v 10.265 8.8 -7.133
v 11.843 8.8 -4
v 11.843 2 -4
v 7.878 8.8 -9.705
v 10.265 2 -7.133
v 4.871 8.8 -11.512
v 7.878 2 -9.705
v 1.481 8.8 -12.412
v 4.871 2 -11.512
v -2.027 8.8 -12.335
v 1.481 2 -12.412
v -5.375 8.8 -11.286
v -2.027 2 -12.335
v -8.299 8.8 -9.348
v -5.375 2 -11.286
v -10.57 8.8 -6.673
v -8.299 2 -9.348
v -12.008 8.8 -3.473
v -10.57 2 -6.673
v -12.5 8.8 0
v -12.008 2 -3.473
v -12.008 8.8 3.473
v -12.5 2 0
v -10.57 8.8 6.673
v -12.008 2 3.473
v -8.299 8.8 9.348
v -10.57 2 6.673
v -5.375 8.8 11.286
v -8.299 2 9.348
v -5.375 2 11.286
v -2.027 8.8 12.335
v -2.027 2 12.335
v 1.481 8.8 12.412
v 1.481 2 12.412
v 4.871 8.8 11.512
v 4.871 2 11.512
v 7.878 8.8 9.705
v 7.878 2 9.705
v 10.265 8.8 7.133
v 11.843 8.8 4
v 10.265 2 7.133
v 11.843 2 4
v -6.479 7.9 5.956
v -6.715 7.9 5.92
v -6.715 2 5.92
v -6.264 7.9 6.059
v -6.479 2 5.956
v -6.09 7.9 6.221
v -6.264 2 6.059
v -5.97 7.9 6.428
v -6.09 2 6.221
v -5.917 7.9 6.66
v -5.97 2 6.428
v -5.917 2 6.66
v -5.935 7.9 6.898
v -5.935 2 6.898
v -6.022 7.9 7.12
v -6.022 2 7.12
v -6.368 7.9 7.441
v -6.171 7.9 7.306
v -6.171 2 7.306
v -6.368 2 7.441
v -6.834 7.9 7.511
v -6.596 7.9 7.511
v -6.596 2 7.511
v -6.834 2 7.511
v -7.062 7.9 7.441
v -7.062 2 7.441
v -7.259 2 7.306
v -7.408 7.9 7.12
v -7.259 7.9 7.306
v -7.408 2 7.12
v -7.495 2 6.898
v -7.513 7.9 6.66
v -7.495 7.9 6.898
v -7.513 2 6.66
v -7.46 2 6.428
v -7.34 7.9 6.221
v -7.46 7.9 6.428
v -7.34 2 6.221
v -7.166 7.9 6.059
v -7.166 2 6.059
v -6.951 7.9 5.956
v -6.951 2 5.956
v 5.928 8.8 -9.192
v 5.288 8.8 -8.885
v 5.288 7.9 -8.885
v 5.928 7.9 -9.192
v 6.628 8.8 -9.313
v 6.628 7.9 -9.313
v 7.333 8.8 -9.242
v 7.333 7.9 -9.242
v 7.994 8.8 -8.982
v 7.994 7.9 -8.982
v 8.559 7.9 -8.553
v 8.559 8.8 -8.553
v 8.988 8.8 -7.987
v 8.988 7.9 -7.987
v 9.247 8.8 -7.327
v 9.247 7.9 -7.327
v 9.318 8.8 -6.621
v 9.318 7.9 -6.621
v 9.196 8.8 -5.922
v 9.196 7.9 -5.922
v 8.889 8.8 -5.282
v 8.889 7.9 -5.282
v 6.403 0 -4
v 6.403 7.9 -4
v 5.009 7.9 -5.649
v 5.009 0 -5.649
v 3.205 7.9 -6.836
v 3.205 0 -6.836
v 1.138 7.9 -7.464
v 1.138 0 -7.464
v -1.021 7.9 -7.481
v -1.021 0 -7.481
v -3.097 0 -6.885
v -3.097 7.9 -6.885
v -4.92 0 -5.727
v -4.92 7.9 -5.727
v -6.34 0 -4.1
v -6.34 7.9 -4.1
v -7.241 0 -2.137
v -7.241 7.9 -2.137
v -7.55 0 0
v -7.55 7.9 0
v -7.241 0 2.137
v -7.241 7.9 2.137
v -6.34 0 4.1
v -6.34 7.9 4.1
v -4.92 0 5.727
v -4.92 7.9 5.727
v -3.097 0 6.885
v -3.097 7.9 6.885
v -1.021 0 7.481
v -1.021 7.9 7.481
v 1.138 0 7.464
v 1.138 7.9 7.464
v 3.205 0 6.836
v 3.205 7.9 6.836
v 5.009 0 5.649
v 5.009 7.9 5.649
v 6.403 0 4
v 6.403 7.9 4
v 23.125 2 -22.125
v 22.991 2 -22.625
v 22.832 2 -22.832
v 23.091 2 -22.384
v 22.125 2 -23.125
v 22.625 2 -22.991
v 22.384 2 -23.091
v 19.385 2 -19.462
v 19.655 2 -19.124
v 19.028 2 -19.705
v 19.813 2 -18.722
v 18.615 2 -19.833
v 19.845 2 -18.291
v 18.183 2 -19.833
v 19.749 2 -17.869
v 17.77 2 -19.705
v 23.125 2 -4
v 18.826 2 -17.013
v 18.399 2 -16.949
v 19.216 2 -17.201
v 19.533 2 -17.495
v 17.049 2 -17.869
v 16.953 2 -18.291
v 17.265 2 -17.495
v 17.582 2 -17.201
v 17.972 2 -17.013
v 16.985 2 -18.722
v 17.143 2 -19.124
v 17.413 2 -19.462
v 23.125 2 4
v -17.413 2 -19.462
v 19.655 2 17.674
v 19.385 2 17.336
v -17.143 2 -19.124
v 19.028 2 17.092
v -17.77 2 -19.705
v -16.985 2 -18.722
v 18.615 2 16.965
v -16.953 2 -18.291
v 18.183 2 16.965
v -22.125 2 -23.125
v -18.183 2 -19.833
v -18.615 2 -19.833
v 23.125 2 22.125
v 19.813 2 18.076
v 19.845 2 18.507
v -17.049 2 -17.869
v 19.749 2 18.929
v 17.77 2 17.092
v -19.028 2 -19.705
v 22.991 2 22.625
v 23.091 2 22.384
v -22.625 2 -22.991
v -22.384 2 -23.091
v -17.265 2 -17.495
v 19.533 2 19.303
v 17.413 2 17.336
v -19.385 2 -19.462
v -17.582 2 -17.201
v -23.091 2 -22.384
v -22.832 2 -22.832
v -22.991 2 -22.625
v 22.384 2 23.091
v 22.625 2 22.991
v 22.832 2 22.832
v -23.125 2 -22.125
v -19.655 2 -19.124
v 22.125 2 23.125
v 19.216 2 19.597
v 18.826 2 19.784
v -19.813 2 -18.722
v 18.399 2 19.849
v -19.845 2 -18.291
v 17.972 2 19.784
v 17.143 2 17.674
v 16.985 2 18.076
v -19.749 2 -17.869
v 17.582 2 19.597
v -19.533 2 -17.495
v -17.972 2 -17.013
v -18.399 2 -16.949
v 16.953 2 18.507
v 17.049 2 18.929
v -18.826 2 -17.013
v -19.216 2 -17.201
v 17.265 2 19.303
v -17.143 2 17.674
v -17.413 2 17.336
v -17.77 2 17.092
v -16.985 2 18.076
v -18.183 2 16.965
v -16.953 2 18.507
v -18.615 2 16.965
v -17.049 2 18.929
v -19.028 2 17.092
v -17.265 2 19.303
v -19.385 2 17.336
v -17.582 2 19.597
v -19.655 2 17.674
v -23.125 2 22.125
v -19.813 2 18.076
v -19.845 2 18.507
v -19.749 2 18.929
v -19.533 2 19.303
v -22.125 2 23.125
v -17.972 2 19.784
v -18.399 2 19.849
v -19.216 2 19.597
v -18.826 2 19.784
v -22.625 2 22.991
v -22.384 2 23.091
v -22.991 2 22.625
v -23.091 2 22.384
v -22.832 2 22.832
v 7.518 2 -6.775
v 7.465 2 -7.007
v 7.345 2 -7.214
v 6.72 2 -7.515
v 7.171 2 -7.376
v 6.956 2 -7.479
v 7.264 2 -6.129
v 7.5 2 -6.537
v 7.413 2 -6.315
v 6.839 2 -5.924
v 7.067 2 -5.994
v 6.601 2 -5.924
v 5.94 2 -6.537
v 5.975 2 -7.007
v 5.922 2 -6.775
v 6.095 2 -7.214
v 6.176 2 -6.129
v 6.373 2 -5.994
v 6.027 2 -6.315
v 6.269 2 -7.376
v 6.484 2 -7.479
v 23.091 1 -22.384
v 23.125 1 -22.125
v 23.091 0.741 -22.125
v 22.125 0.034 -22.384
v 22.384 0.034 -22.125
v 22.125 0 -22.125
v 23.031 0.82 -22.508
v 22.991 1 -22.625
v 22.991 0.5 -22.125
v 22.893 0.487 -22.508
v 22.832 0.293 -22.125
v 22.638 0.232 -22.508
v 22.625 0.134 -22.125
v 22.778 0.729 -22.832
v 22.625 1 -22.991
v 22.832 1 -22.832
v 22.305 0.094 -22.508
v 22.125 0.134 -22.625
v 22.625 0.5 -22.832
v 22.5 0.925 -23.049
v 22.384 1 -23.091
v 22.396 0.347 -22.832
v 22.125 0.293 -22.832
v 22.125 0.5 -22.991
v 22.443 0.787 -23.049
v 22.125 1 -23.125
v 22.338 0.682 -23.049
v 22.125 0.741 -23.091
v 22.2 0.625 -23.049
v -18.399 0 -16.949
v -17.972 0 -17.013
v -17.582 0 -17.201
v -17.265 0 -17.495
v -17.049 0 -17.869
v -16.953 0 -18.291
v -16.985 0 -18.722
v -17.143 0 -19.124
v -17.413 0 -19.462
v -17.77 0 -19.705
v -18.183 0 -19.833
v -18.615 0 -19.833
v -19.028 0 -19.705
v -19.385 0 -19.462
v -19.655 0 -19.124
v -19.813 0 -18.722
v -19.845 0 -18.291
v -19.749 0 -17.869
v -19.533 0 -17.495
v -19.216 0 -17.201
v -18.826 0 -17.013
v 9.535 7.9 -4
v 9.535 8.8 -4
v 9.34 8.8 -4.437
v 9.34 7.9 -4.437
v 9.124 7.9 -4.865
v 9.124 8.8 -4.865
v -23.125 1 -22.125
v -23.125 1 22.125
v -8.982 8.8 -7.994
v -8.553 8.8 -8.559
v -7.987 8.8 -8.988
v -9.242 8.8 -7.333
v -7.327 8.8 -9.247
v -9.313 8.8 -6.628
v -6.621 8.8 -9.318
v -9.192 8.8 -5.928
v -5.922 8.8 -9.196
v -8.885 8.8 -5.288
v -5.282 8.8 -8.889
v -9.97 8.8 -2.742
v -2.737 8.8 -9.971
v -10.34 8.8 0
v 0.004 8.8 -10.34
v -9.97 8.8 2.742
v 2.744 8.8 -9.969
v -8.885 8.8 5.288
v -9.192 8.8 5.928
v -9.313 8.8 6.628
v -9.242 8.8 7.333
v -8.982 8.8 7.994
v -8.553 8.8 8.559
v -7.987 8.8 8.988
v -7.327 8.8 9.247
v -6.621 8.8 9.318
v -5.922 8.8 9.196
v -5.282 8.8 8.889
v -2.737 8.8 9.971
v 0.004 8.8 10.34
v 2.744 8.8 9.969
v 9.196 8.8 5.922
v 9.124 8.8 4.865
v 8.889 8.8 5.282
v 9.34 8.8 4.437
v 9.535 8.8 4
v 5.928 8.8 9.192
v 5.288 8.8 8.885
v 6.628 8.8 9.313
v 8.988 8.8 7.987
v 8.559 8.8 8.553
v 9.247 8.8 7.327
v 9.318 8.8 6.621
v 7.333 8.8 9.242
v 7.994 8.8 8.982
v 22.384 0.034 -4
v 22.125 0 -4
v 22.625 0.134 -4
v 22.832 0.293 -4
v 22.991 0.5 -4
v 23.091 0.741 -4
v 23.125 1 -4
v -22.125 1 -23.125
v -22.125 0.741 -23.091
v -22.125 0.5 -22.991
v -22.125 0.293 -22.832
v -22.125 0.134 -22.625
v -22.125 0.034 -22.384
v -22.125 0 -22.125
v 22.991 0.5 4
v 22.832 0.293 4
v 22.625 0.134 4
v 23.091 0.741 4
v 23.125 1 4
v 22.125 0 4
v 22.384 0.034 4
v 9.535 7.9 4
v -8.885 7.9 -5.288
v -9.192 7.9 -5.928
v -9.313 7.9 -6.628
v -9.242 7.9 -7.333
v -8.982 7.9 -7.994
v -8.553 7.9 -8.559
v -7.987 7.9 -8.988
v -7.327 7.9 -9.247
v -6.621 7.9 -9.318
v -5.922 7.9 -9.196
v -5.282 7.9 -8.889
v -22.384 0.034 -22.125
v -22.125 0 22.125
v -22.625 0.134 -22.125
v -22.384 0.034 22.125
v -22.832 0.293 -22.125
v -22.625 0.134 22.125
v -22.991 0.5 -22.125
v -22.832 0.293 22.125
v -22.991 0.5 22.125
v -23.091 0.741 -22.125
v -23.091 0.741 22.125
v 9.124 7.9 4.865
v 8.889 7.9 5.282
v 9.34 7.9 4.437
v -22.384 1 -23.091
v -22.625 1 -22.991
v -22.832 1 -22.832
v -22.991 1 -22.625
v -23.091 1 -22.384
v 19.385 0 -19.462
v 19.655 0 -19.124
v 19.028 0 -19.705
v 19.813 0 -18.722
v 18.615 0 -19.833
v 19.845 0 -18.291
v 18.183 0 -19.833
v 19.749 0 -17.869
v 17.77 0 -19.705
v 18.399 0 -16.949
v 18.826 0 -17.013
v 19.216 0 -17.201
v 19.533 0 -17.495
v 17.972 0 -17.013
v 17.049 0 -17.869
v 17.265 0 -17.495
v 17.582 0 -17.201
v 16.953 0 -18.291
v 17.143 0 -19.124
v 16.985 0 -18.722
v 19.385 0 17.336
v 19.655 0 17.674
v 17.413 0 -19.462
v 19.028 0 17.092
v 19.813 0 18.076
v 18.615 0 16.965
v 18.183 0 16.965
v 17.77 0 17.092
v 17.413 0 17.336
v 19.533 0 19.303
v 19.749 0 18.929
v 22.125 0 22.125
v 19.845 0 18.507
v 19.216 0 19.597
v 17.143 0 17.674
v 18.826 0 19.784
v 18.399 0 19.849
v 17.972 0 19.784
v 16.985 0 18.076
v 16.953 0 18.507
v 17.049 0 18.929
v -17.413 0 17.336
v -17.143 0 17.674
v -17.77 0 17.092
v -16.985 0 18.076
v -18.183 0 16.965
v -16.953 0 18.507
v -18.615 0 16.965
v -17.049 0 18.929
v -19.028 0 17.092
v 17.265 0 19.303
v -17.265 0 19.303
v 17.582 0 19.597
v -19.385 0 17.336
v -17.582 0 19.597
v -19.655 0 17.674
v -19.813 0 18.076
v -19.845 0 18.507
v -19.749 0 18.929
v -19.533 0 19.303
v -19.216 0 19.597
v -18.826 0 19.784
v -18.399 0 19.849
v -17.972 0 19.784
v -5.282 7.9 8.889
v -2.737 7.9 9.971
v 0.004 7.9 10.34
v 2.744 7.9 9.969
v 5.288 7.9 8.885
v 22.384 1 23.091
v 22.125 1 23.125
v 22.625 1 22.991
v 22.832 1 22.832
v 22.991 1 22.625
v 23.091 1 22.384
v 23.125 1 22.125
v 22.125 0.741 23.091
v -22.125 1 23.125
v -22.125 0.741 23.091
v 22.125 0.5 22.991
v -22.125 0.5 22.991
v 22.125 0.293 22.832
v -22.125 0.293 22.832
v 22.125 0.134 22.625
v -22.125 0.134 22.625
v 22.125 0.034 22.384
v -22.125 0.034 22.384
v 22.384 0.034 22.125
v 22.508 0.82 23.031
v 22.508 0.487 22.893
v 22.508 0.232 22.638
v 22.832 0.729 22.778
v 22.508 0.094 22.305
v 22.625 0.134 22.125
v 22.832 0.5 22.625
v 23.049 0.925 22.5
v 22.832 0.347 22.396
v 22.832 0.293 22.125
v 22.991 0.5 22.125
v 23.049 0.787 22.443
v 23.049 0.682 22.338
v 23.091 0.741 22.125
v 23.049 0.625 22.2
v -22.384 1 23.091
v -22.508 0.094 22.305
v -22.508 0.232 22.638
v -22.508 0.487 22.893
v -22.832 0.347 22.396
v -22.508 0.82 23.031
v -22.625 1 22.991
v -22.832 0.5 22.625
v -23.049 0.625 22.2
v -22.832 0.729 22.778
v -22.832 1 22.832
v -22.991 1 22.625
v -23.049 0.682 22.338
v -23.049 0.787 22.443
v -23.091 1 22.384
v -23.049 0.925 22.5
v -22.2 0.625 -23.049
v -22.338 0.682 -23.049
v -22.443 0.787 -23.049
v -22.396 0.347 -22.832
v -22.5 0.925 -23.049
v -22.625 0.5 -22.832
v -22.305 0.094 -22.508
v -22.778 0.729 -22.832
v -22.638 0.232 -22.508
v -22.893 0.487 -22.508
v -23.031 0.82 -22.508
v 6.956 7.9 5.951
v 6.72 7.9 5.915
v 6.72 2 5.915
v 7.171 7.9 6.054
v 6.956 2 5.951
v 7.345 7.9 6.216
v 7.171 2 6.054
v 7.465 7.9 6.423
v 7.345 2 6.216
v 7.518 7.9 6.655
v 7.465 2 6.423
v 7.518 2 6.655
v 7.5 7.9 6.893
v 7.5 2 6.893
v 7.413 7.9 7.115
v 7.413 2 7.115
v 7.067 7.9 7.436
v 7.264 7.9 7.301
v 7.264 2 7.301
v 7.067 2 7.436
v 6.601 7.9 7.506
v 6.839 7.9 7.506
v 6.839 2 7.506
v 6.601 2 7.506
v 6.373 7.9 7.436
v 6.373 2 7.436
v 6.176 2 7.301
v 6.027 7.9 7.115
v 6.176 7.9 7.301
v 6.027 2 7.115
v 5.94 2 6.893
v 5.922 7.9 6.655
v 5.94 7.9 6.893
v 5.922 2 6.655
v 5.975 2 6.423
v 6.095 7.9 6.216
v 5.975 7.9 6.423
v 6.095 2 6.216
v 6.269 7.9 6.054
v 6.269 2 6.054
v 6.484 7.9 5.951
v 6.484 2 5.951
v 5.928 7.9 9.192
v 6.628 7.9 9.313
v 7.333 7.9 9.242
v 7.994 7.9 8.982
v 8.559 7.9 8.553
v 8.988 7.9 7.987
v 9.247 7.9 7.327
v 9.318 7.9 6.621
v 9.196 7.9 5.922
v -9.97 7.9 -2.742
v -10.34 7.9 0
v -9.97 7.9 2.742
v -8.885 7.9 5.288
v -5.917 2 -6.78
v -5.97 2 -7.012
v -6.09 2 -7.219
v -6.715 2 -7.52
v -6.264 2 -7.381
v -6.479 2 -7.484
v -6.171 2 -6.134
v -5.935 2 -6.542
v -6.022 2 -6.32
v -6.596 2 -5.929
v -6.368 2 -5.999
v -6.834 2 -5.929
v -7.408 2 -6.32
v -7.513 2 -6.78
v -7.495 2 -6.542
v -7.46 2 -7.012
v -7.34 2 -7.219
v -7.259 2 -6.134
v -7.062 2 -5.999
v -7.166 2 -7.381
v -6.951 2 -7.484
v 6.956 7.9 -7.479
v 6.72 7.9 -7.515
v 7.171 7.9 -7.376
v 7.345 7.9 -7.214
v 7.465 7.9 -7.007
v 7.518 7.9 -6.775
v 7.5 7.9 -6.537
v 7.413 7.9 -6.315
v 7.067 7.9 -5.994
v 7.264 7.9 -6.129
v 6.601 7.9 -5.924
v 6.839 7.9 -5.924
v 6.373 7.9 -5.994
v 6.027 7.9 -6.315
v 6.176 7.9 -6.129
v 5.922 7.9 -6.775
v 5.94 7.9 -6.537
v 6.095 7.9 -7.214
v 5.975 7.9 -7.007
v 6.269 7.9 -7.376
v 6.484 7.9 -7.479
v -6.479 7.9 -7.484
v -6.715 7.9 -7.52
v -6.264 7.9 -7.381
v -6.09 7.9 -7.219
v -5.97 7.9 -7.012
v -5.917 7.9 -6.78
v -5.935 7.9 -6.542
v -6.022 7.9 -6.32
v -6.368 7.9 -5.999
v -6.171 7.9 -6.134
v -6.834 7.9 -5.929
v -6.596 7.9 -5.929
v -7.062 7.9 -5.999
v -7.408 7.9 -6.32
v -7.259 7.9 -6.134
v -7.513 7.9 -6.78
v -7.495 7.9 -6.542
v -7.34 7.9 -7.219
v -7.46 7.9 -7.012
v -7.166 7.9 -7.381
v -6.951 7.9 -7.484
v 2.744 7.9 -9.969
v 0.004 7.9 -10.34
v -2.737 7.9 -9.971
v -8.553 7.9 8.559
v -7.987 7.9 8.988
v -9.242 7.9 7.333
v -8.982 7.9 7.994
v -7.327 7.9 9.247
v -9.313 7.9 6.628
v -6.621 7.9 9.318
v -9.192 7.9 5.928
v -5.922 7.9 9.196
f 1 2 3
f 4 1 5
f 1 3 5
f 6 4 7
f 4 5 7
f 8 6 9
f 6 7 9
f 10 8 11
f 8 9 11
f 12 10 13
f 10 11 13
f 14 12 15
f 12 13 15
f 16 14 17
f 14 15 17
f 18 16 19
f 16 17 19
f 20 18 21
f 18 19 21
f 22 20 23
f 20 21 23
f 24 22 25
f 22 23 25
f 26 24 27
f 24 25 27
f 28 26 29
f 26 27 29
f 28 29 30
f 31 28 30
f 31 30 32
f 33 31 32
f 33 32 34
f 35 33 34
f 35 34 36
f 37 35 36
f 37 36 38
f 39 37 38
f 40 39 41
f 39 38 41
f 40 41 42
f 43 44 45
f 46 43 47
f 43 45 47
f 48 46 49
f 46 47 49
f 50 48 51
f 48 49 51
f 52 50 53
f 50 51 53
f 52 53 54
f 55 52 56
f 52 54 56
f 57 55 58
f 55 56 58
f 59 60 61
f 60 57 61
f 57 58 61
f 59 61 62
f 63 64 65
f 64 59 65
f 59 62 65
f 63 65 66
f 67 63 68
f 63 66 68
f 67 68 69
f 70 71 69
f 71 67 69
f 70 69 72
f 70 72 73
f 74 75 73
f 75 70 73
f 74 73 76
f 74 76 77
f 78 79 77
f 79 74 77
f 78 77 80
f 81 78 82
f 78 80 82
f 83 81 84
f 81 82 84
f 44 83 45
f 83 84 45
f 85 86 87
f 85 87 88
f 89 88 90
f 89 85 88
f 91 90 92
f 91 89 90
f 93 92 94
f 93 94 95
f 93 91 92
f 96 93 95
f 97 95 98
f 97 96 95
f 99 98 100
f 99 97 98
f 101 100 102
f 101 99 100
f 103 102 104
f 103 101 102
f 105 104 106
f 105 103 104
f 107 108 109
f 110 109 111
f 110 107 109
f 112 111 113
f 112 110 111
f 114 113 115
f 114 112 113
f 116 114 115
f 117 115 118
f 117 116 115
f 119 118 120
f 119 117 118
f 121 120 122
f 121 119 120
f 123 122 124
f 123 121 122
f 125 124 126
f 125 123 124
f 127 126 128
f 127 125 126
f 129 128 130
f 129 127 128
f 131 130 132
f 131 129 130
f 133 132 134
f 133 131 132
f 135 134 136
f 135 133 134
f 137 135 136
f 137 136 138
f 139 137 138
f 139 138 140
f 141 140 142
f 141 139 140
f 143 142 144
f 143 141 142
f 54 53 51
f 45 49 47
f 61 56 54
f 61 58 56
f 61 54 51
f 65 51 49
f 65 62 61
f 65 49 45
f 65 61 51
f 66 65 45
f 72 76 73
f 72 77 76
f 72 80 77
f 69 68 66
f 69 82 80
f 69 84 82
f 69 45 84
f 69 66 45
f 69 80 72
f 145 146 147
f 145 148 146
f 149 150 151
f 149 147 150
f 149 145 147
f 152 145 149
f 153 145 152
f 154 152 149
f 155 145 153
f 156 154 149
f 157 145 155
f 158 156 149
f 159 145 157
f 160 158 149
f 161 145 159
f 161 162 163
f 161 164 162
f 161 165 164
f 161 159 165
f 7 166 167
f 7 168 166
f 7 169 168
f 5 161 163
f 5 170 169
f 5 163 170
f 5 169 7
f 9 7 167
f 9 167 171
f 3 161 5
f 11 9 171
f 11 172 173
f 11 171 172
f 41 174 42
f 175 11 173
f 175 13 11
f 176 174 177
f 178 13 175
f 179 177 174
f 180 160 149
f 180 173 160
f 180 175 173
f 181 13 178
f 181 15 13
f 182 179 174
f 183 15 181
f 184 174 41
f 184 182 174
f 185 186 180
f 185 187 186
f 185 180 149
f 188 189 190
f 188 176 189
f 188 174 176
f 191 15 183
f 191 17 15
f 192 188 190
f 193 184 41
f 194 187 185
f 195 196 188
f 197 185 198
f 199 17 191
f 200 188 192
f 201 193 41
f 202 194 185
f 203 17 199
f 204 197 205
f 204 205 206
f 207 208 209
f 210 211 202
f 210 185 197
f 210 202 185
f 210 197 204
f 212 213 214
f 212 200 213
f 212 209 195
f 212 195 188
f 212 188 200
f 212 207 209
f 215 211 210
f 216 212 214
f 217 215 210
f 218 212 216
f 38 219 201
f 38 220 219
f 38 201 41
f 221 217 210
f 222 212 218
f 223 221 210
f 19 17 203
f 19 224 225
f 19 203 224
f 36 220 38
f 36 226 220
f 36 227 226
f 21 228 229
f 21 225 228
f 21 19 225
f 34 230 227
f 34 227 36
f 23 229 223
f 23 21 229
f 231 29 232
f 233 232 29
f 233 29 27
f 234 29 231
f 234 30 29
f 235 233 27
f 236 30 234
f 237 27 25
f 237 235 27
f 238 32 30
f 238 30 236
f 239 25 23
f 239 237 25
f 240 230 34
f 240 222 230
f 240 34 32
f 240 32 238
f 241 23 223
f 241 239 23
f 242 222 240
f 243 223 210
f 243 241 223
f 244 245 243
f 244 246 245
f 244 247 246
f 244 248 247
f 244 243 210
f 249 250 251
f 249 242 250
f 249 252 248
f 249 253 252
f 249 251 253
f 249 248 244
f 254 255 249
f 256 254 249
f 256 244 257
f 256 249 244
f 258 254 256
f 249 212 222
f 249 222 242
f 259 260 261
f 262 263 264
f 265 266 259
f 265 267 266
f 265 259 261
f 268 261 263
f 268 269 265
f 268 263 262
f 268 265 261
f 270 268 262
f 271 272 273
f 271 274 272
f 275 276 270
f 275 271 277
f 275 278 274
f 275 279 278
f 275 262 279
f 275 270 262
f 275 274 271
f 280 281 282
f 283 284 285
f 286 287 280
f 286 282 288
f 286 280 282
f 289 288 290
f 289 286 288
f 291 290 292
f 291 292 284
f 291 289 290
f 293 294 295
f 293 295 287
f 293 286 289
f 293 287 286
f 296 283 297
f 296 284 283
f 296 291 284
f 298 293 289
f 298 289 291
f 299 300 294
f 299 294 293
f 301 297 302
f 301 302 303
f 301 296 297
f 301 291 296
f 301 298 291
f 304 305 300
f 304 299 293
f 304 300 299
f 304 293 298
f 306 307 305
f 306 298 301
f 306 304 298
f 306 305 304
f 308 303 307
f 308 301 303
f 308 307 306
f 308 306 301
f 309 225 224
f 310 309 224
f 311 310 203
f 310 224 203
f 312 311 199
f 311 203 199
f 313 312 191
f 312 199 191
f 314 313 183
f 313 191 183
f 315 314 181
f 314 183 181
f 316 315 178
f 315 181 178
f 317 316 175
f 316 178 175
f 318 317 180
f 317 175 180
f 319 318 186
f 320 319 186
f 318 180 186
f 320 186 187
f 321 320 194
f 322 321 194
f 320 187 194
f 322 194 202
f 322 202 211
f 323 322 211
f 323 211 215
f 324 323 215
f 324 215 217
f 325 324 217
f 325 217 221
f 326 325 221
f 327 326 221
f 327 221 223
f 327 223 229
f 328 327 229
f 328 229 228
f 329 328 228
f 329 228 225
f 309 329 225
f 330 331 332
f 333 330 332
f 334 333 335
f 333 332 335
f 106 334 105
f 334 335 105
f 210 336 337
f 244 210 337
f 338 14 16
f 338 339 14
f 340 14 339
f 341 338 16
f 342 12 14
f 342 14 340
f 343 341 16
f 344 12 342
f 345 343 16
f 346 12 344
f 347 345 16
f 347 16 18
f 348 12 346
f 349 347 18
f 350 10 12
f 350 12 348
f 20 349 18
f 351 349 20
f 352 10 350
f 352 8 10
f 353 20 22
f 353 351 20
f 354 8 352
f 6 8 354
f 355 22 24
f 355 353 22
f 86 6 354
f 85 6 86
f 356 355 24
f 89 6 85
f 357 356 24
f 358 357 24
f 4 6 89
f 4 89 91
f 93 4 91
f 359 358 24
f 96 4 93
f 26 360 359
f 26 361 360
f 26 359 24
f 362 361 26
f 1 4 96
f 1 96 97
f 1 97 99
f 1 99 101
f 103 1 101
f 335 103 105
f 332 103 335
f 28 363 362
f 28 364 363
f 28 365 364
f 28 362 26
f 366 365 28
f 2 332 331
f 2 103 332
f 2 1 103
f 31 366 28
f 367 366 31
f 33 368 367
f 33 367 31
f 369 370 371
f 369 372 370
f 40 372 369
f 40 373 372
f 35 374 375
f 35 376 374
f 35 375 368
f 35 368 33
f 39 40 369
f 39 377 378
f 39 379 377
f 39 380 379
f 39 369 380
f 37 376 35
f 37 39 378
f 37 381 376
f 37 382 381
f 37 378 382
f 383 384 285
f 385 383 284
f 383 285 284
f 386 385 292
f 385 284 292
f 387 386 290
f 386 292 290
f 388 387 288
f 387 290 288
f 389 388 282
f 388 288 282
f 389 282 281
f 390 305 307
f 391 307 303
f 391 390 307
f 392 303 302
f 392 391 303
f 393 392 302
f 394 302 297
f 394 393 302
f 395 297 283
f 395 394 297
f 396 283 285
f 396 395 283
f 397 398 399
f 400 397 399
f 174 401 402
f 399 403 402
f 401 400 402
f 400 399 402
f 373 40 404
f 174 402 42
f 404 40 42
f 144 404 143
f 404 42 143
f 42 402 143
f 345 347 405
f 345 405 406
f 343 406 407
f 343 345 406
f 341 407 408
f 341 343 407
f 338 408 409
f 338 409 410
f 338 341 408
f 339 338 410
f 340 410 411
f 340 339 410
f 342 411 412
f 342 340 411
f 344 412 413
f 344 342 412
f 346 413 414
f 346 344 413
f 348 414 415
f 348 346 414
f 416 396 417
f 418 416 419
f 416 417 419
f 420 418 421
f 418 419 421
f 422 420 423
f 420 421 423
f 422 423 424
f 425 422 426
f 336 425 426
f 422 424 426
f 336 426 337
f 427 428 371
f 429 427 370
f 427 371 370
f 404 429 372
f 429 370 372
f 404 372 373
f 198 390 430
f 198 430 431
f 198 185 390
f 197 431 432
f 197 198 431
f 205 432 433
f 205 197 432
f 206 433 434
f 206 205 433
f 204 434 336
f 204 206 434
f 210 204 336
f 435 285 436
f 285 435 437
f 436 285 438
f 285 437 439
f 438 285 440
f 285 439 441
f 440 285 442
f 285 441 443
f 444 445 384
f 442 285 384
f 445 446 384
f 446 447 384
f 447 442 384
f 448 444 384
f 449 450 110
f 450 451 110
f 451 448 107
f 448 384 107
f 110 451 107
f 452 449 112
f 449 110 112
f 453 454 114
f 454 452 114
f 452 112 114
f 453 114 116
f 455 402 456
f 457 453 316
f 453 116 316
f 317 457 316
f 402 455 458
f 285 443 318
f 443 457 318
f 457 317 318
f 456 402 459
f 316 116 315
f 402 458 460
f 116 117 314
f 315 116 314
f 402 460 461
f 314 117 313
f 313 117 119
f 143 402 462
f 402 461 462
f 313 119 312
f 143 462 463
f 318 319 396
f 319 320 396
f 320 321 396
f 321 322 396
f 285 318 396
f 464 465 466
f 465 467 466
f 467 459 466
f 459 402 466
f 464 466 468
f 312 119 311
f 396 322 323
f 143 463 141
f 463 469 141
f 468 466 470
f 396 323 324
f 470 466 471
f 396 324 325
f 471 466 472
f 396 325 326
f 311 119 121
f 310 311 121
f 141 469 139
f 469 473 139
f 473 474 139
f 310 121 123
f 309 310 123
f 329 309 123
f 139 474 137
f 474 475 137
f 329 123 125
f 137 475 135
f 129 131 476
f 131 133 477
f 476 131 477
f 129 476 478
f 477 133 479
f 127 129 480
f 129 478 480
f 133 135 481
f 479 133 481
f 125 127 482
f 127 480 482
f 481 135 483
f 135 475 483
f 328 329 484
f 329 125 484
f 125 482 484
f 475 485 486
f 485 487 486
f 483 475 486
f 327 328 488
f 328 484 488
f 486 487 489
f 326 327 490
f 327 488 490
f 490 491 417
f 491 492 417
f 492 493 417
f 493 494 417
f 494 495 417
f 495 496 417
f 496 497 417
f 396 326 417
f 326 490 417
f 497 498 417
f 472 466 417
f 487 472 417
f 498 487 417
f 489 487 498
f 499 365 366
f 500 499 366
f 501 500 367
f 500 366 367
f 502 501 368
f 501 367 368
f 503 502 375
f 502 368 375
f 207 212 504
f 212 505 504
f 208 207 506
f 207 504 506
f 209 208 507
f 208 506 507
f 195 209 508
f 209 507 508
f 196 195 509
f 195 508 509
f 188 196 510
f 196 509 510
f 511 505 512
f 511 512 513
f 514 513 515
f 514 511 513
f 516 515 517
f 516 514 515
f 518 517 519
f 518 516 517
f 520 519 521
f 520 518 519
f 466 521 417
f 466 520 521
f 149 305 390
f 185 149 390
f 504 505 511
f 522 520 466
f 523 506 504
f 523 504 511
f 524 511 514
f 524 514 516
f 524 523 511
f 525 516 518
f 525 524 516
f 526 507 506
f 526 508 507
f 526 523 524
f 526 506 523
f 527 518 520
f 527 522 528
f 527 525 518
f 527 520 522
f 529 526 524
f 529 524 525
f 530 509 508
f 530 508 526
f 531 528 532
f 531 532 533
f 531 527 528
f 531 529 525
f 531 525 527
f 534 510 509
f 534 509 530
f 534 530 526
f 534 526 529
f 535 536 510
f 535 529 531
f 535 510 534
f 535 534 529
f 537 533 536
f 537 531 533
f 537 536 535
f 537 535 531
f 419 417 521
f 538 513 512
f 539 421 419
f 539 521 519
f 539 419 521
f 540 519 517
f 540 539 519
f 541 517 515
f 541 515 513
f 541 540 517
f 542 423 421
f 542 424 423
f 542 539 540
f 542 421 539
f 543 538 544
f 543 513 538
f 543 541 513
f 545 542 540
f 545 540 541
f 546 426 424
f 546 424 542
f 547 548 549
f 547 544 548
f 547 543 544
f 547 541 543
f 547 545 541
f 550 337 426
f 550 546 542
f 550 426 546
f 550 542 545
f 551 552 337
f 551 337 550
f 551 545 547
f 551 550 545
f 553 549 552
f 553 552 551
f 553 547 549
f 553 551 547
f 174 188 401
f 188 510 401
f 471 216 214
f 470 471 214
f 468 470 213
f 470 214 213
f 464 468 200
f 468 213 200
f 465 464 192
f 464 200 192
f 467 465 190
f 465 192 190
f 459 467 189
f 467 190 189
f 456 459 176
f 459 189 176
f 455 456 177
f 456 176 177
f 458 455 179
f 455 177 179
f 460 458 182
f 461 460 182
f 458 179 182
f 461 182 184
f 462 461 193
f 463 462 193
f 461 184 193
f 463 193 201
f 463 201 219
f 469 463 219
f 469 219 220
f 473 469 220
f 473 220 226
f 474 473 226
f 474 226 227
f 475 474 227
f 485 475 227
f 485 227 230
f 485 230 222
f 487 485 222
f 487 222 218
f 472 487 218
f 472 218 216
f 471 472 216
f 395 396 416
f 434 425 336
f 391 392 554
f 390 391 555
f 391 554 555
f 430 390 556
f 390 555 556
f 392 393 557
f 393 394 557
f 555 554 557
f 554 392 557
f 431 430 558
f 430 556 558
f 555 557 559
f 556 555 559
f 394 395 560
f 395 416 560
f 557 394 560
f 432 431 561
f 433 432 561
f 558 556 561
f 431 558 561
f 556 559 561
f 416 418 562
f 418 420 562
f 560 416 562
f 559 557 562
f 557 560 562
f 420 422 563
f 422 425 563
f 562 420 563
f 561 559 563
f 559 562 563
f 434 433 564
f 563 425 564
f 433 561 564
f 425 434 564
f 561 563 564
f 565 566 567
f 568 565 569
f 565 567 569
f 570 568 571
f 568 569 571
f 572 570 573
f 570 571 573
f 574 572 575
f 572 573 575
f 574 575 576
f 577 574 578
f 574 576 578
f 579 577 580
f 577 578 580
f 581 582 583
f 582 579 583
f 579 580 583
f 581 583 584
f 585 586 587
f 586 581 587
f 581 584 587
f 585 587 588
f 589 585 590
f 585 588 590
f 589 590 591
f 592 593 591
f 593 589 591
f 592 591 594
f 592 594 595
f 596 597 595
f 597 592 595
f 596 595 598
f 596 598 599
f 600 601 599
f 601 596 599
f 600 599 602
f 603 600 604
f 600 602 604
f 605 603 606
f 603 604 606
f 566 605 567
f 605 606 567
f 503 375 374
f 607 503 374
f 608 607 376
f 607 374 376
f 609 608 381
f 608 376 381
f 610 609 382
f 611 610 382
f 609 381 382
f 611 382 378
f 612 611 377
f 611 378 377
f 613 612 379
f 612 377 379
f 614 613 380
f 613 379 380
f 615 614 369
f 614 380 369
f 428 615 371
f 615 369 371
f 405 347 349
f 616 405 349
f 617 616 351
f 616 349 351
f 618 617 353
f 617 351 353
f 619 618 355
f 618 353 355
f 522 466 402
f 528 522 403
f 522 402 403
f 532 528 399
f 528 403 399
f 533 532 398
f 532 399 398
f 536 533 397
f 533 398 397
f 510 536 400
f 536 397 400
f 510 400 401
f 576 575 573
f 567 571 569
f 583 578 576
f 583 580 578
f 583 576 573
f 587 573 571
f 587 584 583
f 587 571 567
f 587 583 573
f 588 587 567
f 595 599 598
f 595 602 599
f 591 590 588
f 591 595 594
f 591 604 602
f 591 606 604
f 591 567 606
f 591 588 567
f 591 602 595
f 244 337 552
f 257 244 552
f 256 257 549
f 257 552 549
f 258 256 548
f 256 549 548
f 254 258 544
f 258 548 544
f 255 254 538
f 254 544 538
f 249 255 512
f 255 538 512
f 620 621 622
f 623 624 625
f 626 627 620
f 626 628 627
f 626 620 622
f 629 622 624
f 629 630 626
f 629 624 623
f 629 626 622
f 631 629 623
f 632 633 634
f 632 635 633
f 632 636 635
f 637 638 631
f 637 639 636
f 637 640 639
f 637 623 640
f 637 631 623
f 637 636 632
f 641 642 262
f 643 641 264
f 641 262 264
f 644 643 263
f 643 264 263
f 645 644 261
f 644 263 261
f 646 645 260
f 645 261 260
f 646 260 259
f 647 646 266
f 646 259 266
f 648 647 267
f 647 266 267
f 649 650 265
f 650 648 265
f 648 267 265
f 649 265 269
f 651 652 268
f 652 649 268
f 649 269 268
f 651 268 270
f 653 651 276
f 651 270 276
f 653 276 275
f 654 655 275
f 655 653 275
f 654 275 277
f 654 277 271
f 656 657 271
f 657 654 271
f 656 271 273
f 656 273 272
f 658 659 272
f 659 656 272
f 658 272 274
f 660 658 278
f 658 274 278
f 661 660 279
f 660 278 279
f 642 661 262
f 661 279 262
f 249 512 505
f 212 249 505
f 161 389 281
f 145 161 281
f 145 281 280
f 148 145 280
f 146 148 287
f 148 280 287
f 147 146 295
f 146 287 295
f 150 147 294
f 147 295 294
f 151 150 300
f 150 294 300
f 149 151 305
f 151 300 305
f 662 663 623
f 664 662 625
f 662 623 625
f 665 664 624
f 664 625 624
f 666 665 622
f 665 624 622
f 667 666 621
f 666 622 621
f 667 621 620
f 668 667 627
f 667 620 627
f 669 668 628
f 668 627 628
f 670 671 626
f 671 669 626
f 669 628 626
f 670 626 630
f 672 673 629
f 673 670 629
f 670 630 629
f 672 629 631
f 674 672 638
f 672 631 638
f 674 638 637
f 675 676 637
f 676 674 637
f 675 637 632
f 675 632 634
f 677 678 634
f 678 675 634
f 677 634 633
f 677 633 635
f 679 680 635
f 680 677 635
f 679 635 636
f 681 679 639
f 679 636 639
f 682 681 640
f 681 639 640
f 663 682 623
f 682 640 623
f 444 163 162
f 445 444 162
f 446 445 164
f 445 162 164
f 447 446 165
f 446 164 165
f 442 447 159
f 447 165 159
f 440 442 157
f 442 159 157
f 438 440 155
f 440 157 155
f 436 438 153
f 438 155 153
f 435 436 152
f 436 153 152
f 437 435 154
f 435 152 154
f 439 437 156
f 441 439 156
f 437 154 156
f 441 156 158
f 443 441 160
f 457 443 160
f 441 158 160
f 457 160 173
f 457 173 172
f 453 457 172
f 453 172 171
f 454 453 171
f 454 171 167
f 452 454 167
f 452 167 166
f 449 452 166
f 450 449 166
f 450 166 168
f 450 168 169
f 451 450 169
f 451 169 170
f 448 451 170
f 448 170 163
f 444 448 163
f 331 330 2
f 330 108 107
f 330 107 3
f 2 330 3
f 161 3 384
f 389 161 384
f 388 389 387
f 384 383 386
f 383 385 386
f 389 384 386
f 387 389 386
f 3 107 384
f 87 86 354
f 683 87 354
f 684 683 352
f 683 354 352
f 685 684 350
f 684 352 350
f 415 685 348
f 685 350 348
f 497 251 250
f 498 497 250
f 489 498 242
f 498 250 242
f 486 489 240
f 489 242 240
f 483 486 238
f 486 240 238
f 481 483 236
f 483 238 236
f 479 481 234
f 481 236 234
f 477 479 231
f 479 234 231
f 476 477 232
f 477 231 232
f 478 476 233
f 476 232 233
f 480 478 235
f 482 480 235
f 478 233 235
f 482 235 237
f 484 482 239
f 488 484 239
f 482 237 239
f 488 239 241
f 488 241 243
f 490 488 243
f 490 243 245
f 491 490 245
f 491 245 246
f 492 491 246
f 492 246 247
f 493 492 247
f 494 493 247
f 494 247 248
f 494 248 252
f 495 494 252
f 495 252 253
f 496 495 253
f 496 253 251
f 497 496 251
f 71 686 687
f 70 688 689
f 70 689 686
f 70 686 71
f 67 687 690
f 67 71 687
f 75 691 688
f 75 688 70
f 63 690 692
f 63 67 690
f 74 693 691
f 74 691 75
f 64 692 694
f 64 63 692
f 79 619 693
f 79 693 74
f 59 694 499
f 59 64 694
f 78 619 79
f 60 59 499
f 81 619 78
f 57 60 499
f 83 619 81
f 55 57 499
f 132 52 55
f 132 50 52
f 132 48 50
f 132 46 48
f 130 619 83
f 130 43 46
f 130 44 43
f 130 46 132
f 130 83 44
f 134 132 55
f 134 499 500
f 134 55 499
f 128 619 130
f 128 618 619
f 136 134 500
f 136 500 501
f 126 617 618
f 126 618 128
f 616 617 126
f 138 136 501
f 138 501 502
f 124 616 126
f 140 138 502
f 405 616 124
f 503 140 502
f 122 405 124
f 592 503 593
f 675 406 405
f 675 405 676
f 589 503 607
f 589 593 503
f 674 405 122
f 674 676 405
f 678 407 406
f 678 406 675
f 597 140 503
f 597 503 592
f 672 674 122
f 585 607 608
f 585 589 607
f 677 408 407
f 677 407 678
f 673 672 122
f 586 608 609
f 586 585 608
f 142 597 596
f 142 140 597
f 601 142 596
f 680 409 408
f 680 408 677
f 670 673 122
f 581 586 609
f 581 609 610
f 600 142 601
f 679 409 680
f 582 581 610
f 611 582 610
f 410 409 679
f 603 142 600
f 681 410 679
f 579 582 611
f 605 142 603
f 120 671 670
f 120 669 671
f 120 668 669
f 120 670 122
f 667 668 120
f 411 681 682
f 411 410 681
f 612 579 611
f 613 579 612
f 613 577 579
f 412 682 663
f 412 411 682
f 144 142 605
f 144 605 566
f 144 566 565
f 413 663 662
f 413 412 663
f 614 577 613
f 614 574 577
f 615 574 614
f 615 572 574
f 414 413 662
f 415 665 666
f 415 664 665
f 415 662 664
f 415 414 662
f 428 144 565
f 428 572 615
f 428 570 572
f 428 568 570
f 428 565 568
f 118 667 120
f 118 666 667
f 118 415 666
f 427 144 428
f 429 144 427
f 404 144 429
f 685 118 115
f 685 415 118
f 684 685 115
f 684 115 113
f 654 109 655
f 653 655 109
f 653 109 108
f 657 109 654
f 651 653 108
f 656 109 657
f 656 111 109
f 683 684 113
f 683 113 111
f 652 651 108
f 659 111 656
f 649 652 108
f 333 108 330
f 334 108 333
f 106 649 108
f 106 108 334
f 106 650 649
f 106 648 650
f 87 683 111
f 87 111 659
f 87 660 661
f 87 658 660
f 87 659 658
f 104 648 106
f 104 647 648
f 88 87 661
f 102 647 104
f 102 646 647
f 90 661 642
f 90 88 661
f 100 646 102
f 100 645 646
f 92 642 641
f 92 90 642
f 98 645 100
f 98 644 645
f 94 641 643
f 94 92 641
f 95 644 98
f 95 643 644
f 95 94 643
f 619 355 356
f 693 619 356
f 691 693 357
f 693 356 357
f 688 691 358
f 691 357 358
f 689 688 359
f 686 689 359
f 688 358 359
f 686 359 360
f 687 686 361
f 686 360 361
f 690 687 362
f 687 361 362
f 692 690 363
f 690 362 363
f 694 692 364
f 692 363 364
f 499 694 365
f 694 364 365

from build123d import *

# Parameters (mm, degrees)
SKETCH3_R                   = 12.5
SKETCH3_R_2                 = 7.55
BOSS_EXTRUDE2_DEPTH         = 8.8
SKETCH4_W                   = 6.878404869
SKETCH4_H                   = 8
CUT_EXTRUDE2_DEPTH          = 8.8
SKETCH8_R                   = 10.34
CUT_EXTRUDE5_DEPTH          = 0.9
TAP_DRILL_FOR_M2X0_4_TAP1_D = 1.6
CUT_EXTRUDE6_DEPTH          = 0.9
BOSS_EXTRUDE4_DEPTH         = 2
FILLET2_R                   = 1
FILLET3_R                   = 1
M2_5_CLEARANCE_HOLE1_D      = 2.9
FILLET4_R                   = 1
FILLET5_R                   = 1


with BuildPart() as part:
    # Sketch3 → Boss-Extrude2 (new body)
    with BuildSketch(Plane(origin=(0, 0, 0), x_dir=(1, 0, 0), z_dir=(0, 1, 0))):
        with Locations(Location((0, 0, 0), (0, 0, 270))):
            Circle(SKETCH3_R)
        with Locations(Location((0, 0, 0), (0, 0, 270))):
            Circle(SKETCH3_R_2, mode=Mode.SUBTRACT)
    extrude(amount=BOSS_EXTRUDE2_DEPTH)

    # Sketch4 → Cut-Extrude2 (cut)
    with BuildSketch(Plane(origin=(0, 8.8, 0), x_dir=(1, 0, 0), z_dir=(0, 1, 0))):
        with Locations((9.842521887, 0)):
            Rectangle(SKETCH4_W, SKETCH4_H)
    extrude(amount=-CUT_EXTRUDE2_DEPTH, mode=Mode.SUBTRACT)

    # Sketch8 → Cut-Extrude5 (cut)
    with BuildSketch(Plane(origin=(0, 8.8, 0), x_dir=(1, 0, 0), z_dir=(0, 1, 0))):
        Circle(SKETCH8_R)
    extrude(amount=-CUT_EXTRUDE5_DEPTH, mode=Mode.SUBTRACT)

    # Tap Drill for M2x0.4 Tap1 (through all)
    with Locations(Plane(origin=(6.72, 8.8, 6.715027923), x_dir=(0, 0, 1), z_dir=(0, 1, 0))):
        with Locations((0, 0), (0.004972077, -13.435027923), (-13.435027923, -13.435027923), (-13.430055846, 0)):
            Hole(TAP_DRILL_FOR_M2X0_4_TAP1_D / 2)

    # Sketch11 → Cut-Extrude6 (cut)
    with BuildSketch(Plane(origin=(0, 8.8, 0), x_dir=(1, 0, 0), z_dir=(0, 1, 0))):
        with BuildLine():
            Line((8.889256072, 5.281735177), (5.288313257, 8.885344275))
            ThreePointArc((5.288313257, 8.885344275), (8.559157895, 8.552825038), (8.889256072, 5.281735177))
        make_face()
        with BuildLine():
            Line((8.889256072, -5.281735177), (5.288313257, -8.885344275))
            ThreePointArc((5.288313257, -8.885344275), (8.559157895, -8.552825038), (8.889256072, -5.281735177))
        make_face()
        with BuildLine():
            Line((-5.281735177, -8.889256072), (-8.885344275, -5.288313257))
            ThreePointArc((-8.885344275, -5.288313257), (-8.552825038, -8.559157895), (-5.281735177, -8.889256072))
        make_face()
        with BuildLine():
            Line((-5.281735177, 8.889256072), (-8.885344275, 5.288313257))
            ThreePointArc((-8.885344275, 5.288313257), (-8.552825038, 8.559157895), (-5.281735177, 8.889256072))
        make_face()
    extrude(amount=-CUT_EXTRUDE6_DEPTH, mode=Mode.SUBTRACT)

    # Sketch12 → Boss-Extrude4 (add)
    with BuildSketch(Plane.XZ):
        with BuildLine():
            Line((23.125, -23.125), (-23.125, -23.125))
            Line((-23.125, -23.125), (-23.125, 23.125))
            Line((-23.125, 23.125), (23.125, 23.125))
            Line((23.125, 23.125), (23.125, 4))
            Line((23.125, 4), (6.403319452, 4))
            ThreePointArc((6.403319452, 4), (-7.55, 0), (6.403319452, -4))
            Line((6.403319452, -4), (23.125, -4))
            Line((23.125, -4), (23.125, -23.125))
        make_face()
    extrude(amount=-BOSS_EXTRUDE4_DEPTH)

    # Fillet2
    fillet2_edges = [part.edges().sort_by_distance(p)[0] for p in [
        (0, 0, 23.125),
        (-23.125, 0, 0),
    ]]
    fillet(fillet2_edges, radius=FILLET2_R)

    # Fillet3
    # the kernel refuses this fillet: 1 mm, written as the material it takes off along each edge
    with BuildSketch(Plane(origin=(-22.125, 1, 22.125), x_dir=(0, 0, 1), z_dir=(-1, 0, 0))) as fillet3_piece_1_section:
        Polygon((0, 0), (FILLET3_R, 0), (FILLET3_R, -FILLET3_R), (0, -FILLET3_R), align=None)
    fillet3_piece_1 = extrude(amount=FILLET3_R, mode=Mode.PRIVATE)
    fillet3_piece_1 = fillet3_piece_1 - Plane(origin=(-22.125, 1, 22.125), x_dir=(0, 0.7071067811865475, -0.7071067811865475), z_dir=(-1, 0, 0)) * Sphere(FILLET3_R, mode=Mode.PRIVATE)
    add(fillet3_piece_1, mode=Mode.SUBTRACT)
    with BuildSketch(Plane(origin=(-23.125, 1, 23.125), x_dir=(0, 0, -1), z_dir=(0, 1, 0))) as fillet3_piece_2:
        with BuildLine():
            CenterArc((FILLET3_R, -FILLET3_R), FILLET3_R, 90, 90)
            Line((0, -FILLET3_R), (0, 0))
            Line((0, 0), (FILLET3_R, 0))
        make_face()
    extrude(amount=3.5, mode=Mode.SUBTRACT)

    # M2.5 Clearance Hole1 (through all)
    with Locations(Plane(origin=(18.3989, 0, 18.3989), x_dir=(0, 0, -1), z_dir=(0, -1, 0))):
        with Locations((0, 0), (36.7978, 0), (36.7978, -36.7978), (0, -36.7978)):
            Hole(M2_5_CLEARANCE_HOLE1_D / 2)

    # Fillet4
    fillet4_edges = [part.edges().sort_by_distance(p)[0] for p in [
        (23.125, 0, 13.0625),
        (23.125, 0, -13.5625),
        (-23.125, 1.5, -23.125),
        (23.125, 1.5, 23.125),
        (0.5, 0, -23.125),
        (-22.832106781, 0.292893219, -23.125),
        (23.125, 0.292893219, 22.832106781),
    ]]
    fillet(fillet4_edges, radius=FILLET4_R)

    # Fillet5
    # the kernel refuses this fillet: 1 mm, written as the material it takes off along each edge
    with BuildSketch(Plane(origin=(22.125, 1, -22.125), x_dir=(1, 0, 0), z_dir=(0, 0, -1))) as fillet5_piece_1_section:
        Polygon((0, 0), (FILLET5_R, 0), (FILLET5_R, FILLET5_R), (0, FILLET5_R), align=None)
    fillet5_piece_1 = extrude(amount=FILLET5_R, mode=Mode.PRIVATE)
    fillet5_piece_1 = fillet5_piece_1 - Plane(origin=(22.125, 1, -22.125), x_dir=(-0.7071067811865475, 0.7071067811865475, 0), z_dir=(0, 0, -1)) * Sphere(FILLET5_R, mode=Mode.PRIVATE)
    add(fillet5_piece_1, mode=Mode.SUBTRACT)
    with BuildSketch(Plane(origin=(23.125, 1, -23.125), x_dir=(-1, 0, 0), z_dir=(0, 1, 0))) as fillet5_piece_2:
        with BuildLine():
            CenterArc((FILLET5_R, FILLET5_R), FILLET5_R, 180, 90)
            Line((0, FILLET5_R), (0, 0))
            Line((0, 0), (FILLET5_R, 0))
        make_face()
    extrude(amount=3.5, mode=Mode.SUBTRACT)


solid = part.part
